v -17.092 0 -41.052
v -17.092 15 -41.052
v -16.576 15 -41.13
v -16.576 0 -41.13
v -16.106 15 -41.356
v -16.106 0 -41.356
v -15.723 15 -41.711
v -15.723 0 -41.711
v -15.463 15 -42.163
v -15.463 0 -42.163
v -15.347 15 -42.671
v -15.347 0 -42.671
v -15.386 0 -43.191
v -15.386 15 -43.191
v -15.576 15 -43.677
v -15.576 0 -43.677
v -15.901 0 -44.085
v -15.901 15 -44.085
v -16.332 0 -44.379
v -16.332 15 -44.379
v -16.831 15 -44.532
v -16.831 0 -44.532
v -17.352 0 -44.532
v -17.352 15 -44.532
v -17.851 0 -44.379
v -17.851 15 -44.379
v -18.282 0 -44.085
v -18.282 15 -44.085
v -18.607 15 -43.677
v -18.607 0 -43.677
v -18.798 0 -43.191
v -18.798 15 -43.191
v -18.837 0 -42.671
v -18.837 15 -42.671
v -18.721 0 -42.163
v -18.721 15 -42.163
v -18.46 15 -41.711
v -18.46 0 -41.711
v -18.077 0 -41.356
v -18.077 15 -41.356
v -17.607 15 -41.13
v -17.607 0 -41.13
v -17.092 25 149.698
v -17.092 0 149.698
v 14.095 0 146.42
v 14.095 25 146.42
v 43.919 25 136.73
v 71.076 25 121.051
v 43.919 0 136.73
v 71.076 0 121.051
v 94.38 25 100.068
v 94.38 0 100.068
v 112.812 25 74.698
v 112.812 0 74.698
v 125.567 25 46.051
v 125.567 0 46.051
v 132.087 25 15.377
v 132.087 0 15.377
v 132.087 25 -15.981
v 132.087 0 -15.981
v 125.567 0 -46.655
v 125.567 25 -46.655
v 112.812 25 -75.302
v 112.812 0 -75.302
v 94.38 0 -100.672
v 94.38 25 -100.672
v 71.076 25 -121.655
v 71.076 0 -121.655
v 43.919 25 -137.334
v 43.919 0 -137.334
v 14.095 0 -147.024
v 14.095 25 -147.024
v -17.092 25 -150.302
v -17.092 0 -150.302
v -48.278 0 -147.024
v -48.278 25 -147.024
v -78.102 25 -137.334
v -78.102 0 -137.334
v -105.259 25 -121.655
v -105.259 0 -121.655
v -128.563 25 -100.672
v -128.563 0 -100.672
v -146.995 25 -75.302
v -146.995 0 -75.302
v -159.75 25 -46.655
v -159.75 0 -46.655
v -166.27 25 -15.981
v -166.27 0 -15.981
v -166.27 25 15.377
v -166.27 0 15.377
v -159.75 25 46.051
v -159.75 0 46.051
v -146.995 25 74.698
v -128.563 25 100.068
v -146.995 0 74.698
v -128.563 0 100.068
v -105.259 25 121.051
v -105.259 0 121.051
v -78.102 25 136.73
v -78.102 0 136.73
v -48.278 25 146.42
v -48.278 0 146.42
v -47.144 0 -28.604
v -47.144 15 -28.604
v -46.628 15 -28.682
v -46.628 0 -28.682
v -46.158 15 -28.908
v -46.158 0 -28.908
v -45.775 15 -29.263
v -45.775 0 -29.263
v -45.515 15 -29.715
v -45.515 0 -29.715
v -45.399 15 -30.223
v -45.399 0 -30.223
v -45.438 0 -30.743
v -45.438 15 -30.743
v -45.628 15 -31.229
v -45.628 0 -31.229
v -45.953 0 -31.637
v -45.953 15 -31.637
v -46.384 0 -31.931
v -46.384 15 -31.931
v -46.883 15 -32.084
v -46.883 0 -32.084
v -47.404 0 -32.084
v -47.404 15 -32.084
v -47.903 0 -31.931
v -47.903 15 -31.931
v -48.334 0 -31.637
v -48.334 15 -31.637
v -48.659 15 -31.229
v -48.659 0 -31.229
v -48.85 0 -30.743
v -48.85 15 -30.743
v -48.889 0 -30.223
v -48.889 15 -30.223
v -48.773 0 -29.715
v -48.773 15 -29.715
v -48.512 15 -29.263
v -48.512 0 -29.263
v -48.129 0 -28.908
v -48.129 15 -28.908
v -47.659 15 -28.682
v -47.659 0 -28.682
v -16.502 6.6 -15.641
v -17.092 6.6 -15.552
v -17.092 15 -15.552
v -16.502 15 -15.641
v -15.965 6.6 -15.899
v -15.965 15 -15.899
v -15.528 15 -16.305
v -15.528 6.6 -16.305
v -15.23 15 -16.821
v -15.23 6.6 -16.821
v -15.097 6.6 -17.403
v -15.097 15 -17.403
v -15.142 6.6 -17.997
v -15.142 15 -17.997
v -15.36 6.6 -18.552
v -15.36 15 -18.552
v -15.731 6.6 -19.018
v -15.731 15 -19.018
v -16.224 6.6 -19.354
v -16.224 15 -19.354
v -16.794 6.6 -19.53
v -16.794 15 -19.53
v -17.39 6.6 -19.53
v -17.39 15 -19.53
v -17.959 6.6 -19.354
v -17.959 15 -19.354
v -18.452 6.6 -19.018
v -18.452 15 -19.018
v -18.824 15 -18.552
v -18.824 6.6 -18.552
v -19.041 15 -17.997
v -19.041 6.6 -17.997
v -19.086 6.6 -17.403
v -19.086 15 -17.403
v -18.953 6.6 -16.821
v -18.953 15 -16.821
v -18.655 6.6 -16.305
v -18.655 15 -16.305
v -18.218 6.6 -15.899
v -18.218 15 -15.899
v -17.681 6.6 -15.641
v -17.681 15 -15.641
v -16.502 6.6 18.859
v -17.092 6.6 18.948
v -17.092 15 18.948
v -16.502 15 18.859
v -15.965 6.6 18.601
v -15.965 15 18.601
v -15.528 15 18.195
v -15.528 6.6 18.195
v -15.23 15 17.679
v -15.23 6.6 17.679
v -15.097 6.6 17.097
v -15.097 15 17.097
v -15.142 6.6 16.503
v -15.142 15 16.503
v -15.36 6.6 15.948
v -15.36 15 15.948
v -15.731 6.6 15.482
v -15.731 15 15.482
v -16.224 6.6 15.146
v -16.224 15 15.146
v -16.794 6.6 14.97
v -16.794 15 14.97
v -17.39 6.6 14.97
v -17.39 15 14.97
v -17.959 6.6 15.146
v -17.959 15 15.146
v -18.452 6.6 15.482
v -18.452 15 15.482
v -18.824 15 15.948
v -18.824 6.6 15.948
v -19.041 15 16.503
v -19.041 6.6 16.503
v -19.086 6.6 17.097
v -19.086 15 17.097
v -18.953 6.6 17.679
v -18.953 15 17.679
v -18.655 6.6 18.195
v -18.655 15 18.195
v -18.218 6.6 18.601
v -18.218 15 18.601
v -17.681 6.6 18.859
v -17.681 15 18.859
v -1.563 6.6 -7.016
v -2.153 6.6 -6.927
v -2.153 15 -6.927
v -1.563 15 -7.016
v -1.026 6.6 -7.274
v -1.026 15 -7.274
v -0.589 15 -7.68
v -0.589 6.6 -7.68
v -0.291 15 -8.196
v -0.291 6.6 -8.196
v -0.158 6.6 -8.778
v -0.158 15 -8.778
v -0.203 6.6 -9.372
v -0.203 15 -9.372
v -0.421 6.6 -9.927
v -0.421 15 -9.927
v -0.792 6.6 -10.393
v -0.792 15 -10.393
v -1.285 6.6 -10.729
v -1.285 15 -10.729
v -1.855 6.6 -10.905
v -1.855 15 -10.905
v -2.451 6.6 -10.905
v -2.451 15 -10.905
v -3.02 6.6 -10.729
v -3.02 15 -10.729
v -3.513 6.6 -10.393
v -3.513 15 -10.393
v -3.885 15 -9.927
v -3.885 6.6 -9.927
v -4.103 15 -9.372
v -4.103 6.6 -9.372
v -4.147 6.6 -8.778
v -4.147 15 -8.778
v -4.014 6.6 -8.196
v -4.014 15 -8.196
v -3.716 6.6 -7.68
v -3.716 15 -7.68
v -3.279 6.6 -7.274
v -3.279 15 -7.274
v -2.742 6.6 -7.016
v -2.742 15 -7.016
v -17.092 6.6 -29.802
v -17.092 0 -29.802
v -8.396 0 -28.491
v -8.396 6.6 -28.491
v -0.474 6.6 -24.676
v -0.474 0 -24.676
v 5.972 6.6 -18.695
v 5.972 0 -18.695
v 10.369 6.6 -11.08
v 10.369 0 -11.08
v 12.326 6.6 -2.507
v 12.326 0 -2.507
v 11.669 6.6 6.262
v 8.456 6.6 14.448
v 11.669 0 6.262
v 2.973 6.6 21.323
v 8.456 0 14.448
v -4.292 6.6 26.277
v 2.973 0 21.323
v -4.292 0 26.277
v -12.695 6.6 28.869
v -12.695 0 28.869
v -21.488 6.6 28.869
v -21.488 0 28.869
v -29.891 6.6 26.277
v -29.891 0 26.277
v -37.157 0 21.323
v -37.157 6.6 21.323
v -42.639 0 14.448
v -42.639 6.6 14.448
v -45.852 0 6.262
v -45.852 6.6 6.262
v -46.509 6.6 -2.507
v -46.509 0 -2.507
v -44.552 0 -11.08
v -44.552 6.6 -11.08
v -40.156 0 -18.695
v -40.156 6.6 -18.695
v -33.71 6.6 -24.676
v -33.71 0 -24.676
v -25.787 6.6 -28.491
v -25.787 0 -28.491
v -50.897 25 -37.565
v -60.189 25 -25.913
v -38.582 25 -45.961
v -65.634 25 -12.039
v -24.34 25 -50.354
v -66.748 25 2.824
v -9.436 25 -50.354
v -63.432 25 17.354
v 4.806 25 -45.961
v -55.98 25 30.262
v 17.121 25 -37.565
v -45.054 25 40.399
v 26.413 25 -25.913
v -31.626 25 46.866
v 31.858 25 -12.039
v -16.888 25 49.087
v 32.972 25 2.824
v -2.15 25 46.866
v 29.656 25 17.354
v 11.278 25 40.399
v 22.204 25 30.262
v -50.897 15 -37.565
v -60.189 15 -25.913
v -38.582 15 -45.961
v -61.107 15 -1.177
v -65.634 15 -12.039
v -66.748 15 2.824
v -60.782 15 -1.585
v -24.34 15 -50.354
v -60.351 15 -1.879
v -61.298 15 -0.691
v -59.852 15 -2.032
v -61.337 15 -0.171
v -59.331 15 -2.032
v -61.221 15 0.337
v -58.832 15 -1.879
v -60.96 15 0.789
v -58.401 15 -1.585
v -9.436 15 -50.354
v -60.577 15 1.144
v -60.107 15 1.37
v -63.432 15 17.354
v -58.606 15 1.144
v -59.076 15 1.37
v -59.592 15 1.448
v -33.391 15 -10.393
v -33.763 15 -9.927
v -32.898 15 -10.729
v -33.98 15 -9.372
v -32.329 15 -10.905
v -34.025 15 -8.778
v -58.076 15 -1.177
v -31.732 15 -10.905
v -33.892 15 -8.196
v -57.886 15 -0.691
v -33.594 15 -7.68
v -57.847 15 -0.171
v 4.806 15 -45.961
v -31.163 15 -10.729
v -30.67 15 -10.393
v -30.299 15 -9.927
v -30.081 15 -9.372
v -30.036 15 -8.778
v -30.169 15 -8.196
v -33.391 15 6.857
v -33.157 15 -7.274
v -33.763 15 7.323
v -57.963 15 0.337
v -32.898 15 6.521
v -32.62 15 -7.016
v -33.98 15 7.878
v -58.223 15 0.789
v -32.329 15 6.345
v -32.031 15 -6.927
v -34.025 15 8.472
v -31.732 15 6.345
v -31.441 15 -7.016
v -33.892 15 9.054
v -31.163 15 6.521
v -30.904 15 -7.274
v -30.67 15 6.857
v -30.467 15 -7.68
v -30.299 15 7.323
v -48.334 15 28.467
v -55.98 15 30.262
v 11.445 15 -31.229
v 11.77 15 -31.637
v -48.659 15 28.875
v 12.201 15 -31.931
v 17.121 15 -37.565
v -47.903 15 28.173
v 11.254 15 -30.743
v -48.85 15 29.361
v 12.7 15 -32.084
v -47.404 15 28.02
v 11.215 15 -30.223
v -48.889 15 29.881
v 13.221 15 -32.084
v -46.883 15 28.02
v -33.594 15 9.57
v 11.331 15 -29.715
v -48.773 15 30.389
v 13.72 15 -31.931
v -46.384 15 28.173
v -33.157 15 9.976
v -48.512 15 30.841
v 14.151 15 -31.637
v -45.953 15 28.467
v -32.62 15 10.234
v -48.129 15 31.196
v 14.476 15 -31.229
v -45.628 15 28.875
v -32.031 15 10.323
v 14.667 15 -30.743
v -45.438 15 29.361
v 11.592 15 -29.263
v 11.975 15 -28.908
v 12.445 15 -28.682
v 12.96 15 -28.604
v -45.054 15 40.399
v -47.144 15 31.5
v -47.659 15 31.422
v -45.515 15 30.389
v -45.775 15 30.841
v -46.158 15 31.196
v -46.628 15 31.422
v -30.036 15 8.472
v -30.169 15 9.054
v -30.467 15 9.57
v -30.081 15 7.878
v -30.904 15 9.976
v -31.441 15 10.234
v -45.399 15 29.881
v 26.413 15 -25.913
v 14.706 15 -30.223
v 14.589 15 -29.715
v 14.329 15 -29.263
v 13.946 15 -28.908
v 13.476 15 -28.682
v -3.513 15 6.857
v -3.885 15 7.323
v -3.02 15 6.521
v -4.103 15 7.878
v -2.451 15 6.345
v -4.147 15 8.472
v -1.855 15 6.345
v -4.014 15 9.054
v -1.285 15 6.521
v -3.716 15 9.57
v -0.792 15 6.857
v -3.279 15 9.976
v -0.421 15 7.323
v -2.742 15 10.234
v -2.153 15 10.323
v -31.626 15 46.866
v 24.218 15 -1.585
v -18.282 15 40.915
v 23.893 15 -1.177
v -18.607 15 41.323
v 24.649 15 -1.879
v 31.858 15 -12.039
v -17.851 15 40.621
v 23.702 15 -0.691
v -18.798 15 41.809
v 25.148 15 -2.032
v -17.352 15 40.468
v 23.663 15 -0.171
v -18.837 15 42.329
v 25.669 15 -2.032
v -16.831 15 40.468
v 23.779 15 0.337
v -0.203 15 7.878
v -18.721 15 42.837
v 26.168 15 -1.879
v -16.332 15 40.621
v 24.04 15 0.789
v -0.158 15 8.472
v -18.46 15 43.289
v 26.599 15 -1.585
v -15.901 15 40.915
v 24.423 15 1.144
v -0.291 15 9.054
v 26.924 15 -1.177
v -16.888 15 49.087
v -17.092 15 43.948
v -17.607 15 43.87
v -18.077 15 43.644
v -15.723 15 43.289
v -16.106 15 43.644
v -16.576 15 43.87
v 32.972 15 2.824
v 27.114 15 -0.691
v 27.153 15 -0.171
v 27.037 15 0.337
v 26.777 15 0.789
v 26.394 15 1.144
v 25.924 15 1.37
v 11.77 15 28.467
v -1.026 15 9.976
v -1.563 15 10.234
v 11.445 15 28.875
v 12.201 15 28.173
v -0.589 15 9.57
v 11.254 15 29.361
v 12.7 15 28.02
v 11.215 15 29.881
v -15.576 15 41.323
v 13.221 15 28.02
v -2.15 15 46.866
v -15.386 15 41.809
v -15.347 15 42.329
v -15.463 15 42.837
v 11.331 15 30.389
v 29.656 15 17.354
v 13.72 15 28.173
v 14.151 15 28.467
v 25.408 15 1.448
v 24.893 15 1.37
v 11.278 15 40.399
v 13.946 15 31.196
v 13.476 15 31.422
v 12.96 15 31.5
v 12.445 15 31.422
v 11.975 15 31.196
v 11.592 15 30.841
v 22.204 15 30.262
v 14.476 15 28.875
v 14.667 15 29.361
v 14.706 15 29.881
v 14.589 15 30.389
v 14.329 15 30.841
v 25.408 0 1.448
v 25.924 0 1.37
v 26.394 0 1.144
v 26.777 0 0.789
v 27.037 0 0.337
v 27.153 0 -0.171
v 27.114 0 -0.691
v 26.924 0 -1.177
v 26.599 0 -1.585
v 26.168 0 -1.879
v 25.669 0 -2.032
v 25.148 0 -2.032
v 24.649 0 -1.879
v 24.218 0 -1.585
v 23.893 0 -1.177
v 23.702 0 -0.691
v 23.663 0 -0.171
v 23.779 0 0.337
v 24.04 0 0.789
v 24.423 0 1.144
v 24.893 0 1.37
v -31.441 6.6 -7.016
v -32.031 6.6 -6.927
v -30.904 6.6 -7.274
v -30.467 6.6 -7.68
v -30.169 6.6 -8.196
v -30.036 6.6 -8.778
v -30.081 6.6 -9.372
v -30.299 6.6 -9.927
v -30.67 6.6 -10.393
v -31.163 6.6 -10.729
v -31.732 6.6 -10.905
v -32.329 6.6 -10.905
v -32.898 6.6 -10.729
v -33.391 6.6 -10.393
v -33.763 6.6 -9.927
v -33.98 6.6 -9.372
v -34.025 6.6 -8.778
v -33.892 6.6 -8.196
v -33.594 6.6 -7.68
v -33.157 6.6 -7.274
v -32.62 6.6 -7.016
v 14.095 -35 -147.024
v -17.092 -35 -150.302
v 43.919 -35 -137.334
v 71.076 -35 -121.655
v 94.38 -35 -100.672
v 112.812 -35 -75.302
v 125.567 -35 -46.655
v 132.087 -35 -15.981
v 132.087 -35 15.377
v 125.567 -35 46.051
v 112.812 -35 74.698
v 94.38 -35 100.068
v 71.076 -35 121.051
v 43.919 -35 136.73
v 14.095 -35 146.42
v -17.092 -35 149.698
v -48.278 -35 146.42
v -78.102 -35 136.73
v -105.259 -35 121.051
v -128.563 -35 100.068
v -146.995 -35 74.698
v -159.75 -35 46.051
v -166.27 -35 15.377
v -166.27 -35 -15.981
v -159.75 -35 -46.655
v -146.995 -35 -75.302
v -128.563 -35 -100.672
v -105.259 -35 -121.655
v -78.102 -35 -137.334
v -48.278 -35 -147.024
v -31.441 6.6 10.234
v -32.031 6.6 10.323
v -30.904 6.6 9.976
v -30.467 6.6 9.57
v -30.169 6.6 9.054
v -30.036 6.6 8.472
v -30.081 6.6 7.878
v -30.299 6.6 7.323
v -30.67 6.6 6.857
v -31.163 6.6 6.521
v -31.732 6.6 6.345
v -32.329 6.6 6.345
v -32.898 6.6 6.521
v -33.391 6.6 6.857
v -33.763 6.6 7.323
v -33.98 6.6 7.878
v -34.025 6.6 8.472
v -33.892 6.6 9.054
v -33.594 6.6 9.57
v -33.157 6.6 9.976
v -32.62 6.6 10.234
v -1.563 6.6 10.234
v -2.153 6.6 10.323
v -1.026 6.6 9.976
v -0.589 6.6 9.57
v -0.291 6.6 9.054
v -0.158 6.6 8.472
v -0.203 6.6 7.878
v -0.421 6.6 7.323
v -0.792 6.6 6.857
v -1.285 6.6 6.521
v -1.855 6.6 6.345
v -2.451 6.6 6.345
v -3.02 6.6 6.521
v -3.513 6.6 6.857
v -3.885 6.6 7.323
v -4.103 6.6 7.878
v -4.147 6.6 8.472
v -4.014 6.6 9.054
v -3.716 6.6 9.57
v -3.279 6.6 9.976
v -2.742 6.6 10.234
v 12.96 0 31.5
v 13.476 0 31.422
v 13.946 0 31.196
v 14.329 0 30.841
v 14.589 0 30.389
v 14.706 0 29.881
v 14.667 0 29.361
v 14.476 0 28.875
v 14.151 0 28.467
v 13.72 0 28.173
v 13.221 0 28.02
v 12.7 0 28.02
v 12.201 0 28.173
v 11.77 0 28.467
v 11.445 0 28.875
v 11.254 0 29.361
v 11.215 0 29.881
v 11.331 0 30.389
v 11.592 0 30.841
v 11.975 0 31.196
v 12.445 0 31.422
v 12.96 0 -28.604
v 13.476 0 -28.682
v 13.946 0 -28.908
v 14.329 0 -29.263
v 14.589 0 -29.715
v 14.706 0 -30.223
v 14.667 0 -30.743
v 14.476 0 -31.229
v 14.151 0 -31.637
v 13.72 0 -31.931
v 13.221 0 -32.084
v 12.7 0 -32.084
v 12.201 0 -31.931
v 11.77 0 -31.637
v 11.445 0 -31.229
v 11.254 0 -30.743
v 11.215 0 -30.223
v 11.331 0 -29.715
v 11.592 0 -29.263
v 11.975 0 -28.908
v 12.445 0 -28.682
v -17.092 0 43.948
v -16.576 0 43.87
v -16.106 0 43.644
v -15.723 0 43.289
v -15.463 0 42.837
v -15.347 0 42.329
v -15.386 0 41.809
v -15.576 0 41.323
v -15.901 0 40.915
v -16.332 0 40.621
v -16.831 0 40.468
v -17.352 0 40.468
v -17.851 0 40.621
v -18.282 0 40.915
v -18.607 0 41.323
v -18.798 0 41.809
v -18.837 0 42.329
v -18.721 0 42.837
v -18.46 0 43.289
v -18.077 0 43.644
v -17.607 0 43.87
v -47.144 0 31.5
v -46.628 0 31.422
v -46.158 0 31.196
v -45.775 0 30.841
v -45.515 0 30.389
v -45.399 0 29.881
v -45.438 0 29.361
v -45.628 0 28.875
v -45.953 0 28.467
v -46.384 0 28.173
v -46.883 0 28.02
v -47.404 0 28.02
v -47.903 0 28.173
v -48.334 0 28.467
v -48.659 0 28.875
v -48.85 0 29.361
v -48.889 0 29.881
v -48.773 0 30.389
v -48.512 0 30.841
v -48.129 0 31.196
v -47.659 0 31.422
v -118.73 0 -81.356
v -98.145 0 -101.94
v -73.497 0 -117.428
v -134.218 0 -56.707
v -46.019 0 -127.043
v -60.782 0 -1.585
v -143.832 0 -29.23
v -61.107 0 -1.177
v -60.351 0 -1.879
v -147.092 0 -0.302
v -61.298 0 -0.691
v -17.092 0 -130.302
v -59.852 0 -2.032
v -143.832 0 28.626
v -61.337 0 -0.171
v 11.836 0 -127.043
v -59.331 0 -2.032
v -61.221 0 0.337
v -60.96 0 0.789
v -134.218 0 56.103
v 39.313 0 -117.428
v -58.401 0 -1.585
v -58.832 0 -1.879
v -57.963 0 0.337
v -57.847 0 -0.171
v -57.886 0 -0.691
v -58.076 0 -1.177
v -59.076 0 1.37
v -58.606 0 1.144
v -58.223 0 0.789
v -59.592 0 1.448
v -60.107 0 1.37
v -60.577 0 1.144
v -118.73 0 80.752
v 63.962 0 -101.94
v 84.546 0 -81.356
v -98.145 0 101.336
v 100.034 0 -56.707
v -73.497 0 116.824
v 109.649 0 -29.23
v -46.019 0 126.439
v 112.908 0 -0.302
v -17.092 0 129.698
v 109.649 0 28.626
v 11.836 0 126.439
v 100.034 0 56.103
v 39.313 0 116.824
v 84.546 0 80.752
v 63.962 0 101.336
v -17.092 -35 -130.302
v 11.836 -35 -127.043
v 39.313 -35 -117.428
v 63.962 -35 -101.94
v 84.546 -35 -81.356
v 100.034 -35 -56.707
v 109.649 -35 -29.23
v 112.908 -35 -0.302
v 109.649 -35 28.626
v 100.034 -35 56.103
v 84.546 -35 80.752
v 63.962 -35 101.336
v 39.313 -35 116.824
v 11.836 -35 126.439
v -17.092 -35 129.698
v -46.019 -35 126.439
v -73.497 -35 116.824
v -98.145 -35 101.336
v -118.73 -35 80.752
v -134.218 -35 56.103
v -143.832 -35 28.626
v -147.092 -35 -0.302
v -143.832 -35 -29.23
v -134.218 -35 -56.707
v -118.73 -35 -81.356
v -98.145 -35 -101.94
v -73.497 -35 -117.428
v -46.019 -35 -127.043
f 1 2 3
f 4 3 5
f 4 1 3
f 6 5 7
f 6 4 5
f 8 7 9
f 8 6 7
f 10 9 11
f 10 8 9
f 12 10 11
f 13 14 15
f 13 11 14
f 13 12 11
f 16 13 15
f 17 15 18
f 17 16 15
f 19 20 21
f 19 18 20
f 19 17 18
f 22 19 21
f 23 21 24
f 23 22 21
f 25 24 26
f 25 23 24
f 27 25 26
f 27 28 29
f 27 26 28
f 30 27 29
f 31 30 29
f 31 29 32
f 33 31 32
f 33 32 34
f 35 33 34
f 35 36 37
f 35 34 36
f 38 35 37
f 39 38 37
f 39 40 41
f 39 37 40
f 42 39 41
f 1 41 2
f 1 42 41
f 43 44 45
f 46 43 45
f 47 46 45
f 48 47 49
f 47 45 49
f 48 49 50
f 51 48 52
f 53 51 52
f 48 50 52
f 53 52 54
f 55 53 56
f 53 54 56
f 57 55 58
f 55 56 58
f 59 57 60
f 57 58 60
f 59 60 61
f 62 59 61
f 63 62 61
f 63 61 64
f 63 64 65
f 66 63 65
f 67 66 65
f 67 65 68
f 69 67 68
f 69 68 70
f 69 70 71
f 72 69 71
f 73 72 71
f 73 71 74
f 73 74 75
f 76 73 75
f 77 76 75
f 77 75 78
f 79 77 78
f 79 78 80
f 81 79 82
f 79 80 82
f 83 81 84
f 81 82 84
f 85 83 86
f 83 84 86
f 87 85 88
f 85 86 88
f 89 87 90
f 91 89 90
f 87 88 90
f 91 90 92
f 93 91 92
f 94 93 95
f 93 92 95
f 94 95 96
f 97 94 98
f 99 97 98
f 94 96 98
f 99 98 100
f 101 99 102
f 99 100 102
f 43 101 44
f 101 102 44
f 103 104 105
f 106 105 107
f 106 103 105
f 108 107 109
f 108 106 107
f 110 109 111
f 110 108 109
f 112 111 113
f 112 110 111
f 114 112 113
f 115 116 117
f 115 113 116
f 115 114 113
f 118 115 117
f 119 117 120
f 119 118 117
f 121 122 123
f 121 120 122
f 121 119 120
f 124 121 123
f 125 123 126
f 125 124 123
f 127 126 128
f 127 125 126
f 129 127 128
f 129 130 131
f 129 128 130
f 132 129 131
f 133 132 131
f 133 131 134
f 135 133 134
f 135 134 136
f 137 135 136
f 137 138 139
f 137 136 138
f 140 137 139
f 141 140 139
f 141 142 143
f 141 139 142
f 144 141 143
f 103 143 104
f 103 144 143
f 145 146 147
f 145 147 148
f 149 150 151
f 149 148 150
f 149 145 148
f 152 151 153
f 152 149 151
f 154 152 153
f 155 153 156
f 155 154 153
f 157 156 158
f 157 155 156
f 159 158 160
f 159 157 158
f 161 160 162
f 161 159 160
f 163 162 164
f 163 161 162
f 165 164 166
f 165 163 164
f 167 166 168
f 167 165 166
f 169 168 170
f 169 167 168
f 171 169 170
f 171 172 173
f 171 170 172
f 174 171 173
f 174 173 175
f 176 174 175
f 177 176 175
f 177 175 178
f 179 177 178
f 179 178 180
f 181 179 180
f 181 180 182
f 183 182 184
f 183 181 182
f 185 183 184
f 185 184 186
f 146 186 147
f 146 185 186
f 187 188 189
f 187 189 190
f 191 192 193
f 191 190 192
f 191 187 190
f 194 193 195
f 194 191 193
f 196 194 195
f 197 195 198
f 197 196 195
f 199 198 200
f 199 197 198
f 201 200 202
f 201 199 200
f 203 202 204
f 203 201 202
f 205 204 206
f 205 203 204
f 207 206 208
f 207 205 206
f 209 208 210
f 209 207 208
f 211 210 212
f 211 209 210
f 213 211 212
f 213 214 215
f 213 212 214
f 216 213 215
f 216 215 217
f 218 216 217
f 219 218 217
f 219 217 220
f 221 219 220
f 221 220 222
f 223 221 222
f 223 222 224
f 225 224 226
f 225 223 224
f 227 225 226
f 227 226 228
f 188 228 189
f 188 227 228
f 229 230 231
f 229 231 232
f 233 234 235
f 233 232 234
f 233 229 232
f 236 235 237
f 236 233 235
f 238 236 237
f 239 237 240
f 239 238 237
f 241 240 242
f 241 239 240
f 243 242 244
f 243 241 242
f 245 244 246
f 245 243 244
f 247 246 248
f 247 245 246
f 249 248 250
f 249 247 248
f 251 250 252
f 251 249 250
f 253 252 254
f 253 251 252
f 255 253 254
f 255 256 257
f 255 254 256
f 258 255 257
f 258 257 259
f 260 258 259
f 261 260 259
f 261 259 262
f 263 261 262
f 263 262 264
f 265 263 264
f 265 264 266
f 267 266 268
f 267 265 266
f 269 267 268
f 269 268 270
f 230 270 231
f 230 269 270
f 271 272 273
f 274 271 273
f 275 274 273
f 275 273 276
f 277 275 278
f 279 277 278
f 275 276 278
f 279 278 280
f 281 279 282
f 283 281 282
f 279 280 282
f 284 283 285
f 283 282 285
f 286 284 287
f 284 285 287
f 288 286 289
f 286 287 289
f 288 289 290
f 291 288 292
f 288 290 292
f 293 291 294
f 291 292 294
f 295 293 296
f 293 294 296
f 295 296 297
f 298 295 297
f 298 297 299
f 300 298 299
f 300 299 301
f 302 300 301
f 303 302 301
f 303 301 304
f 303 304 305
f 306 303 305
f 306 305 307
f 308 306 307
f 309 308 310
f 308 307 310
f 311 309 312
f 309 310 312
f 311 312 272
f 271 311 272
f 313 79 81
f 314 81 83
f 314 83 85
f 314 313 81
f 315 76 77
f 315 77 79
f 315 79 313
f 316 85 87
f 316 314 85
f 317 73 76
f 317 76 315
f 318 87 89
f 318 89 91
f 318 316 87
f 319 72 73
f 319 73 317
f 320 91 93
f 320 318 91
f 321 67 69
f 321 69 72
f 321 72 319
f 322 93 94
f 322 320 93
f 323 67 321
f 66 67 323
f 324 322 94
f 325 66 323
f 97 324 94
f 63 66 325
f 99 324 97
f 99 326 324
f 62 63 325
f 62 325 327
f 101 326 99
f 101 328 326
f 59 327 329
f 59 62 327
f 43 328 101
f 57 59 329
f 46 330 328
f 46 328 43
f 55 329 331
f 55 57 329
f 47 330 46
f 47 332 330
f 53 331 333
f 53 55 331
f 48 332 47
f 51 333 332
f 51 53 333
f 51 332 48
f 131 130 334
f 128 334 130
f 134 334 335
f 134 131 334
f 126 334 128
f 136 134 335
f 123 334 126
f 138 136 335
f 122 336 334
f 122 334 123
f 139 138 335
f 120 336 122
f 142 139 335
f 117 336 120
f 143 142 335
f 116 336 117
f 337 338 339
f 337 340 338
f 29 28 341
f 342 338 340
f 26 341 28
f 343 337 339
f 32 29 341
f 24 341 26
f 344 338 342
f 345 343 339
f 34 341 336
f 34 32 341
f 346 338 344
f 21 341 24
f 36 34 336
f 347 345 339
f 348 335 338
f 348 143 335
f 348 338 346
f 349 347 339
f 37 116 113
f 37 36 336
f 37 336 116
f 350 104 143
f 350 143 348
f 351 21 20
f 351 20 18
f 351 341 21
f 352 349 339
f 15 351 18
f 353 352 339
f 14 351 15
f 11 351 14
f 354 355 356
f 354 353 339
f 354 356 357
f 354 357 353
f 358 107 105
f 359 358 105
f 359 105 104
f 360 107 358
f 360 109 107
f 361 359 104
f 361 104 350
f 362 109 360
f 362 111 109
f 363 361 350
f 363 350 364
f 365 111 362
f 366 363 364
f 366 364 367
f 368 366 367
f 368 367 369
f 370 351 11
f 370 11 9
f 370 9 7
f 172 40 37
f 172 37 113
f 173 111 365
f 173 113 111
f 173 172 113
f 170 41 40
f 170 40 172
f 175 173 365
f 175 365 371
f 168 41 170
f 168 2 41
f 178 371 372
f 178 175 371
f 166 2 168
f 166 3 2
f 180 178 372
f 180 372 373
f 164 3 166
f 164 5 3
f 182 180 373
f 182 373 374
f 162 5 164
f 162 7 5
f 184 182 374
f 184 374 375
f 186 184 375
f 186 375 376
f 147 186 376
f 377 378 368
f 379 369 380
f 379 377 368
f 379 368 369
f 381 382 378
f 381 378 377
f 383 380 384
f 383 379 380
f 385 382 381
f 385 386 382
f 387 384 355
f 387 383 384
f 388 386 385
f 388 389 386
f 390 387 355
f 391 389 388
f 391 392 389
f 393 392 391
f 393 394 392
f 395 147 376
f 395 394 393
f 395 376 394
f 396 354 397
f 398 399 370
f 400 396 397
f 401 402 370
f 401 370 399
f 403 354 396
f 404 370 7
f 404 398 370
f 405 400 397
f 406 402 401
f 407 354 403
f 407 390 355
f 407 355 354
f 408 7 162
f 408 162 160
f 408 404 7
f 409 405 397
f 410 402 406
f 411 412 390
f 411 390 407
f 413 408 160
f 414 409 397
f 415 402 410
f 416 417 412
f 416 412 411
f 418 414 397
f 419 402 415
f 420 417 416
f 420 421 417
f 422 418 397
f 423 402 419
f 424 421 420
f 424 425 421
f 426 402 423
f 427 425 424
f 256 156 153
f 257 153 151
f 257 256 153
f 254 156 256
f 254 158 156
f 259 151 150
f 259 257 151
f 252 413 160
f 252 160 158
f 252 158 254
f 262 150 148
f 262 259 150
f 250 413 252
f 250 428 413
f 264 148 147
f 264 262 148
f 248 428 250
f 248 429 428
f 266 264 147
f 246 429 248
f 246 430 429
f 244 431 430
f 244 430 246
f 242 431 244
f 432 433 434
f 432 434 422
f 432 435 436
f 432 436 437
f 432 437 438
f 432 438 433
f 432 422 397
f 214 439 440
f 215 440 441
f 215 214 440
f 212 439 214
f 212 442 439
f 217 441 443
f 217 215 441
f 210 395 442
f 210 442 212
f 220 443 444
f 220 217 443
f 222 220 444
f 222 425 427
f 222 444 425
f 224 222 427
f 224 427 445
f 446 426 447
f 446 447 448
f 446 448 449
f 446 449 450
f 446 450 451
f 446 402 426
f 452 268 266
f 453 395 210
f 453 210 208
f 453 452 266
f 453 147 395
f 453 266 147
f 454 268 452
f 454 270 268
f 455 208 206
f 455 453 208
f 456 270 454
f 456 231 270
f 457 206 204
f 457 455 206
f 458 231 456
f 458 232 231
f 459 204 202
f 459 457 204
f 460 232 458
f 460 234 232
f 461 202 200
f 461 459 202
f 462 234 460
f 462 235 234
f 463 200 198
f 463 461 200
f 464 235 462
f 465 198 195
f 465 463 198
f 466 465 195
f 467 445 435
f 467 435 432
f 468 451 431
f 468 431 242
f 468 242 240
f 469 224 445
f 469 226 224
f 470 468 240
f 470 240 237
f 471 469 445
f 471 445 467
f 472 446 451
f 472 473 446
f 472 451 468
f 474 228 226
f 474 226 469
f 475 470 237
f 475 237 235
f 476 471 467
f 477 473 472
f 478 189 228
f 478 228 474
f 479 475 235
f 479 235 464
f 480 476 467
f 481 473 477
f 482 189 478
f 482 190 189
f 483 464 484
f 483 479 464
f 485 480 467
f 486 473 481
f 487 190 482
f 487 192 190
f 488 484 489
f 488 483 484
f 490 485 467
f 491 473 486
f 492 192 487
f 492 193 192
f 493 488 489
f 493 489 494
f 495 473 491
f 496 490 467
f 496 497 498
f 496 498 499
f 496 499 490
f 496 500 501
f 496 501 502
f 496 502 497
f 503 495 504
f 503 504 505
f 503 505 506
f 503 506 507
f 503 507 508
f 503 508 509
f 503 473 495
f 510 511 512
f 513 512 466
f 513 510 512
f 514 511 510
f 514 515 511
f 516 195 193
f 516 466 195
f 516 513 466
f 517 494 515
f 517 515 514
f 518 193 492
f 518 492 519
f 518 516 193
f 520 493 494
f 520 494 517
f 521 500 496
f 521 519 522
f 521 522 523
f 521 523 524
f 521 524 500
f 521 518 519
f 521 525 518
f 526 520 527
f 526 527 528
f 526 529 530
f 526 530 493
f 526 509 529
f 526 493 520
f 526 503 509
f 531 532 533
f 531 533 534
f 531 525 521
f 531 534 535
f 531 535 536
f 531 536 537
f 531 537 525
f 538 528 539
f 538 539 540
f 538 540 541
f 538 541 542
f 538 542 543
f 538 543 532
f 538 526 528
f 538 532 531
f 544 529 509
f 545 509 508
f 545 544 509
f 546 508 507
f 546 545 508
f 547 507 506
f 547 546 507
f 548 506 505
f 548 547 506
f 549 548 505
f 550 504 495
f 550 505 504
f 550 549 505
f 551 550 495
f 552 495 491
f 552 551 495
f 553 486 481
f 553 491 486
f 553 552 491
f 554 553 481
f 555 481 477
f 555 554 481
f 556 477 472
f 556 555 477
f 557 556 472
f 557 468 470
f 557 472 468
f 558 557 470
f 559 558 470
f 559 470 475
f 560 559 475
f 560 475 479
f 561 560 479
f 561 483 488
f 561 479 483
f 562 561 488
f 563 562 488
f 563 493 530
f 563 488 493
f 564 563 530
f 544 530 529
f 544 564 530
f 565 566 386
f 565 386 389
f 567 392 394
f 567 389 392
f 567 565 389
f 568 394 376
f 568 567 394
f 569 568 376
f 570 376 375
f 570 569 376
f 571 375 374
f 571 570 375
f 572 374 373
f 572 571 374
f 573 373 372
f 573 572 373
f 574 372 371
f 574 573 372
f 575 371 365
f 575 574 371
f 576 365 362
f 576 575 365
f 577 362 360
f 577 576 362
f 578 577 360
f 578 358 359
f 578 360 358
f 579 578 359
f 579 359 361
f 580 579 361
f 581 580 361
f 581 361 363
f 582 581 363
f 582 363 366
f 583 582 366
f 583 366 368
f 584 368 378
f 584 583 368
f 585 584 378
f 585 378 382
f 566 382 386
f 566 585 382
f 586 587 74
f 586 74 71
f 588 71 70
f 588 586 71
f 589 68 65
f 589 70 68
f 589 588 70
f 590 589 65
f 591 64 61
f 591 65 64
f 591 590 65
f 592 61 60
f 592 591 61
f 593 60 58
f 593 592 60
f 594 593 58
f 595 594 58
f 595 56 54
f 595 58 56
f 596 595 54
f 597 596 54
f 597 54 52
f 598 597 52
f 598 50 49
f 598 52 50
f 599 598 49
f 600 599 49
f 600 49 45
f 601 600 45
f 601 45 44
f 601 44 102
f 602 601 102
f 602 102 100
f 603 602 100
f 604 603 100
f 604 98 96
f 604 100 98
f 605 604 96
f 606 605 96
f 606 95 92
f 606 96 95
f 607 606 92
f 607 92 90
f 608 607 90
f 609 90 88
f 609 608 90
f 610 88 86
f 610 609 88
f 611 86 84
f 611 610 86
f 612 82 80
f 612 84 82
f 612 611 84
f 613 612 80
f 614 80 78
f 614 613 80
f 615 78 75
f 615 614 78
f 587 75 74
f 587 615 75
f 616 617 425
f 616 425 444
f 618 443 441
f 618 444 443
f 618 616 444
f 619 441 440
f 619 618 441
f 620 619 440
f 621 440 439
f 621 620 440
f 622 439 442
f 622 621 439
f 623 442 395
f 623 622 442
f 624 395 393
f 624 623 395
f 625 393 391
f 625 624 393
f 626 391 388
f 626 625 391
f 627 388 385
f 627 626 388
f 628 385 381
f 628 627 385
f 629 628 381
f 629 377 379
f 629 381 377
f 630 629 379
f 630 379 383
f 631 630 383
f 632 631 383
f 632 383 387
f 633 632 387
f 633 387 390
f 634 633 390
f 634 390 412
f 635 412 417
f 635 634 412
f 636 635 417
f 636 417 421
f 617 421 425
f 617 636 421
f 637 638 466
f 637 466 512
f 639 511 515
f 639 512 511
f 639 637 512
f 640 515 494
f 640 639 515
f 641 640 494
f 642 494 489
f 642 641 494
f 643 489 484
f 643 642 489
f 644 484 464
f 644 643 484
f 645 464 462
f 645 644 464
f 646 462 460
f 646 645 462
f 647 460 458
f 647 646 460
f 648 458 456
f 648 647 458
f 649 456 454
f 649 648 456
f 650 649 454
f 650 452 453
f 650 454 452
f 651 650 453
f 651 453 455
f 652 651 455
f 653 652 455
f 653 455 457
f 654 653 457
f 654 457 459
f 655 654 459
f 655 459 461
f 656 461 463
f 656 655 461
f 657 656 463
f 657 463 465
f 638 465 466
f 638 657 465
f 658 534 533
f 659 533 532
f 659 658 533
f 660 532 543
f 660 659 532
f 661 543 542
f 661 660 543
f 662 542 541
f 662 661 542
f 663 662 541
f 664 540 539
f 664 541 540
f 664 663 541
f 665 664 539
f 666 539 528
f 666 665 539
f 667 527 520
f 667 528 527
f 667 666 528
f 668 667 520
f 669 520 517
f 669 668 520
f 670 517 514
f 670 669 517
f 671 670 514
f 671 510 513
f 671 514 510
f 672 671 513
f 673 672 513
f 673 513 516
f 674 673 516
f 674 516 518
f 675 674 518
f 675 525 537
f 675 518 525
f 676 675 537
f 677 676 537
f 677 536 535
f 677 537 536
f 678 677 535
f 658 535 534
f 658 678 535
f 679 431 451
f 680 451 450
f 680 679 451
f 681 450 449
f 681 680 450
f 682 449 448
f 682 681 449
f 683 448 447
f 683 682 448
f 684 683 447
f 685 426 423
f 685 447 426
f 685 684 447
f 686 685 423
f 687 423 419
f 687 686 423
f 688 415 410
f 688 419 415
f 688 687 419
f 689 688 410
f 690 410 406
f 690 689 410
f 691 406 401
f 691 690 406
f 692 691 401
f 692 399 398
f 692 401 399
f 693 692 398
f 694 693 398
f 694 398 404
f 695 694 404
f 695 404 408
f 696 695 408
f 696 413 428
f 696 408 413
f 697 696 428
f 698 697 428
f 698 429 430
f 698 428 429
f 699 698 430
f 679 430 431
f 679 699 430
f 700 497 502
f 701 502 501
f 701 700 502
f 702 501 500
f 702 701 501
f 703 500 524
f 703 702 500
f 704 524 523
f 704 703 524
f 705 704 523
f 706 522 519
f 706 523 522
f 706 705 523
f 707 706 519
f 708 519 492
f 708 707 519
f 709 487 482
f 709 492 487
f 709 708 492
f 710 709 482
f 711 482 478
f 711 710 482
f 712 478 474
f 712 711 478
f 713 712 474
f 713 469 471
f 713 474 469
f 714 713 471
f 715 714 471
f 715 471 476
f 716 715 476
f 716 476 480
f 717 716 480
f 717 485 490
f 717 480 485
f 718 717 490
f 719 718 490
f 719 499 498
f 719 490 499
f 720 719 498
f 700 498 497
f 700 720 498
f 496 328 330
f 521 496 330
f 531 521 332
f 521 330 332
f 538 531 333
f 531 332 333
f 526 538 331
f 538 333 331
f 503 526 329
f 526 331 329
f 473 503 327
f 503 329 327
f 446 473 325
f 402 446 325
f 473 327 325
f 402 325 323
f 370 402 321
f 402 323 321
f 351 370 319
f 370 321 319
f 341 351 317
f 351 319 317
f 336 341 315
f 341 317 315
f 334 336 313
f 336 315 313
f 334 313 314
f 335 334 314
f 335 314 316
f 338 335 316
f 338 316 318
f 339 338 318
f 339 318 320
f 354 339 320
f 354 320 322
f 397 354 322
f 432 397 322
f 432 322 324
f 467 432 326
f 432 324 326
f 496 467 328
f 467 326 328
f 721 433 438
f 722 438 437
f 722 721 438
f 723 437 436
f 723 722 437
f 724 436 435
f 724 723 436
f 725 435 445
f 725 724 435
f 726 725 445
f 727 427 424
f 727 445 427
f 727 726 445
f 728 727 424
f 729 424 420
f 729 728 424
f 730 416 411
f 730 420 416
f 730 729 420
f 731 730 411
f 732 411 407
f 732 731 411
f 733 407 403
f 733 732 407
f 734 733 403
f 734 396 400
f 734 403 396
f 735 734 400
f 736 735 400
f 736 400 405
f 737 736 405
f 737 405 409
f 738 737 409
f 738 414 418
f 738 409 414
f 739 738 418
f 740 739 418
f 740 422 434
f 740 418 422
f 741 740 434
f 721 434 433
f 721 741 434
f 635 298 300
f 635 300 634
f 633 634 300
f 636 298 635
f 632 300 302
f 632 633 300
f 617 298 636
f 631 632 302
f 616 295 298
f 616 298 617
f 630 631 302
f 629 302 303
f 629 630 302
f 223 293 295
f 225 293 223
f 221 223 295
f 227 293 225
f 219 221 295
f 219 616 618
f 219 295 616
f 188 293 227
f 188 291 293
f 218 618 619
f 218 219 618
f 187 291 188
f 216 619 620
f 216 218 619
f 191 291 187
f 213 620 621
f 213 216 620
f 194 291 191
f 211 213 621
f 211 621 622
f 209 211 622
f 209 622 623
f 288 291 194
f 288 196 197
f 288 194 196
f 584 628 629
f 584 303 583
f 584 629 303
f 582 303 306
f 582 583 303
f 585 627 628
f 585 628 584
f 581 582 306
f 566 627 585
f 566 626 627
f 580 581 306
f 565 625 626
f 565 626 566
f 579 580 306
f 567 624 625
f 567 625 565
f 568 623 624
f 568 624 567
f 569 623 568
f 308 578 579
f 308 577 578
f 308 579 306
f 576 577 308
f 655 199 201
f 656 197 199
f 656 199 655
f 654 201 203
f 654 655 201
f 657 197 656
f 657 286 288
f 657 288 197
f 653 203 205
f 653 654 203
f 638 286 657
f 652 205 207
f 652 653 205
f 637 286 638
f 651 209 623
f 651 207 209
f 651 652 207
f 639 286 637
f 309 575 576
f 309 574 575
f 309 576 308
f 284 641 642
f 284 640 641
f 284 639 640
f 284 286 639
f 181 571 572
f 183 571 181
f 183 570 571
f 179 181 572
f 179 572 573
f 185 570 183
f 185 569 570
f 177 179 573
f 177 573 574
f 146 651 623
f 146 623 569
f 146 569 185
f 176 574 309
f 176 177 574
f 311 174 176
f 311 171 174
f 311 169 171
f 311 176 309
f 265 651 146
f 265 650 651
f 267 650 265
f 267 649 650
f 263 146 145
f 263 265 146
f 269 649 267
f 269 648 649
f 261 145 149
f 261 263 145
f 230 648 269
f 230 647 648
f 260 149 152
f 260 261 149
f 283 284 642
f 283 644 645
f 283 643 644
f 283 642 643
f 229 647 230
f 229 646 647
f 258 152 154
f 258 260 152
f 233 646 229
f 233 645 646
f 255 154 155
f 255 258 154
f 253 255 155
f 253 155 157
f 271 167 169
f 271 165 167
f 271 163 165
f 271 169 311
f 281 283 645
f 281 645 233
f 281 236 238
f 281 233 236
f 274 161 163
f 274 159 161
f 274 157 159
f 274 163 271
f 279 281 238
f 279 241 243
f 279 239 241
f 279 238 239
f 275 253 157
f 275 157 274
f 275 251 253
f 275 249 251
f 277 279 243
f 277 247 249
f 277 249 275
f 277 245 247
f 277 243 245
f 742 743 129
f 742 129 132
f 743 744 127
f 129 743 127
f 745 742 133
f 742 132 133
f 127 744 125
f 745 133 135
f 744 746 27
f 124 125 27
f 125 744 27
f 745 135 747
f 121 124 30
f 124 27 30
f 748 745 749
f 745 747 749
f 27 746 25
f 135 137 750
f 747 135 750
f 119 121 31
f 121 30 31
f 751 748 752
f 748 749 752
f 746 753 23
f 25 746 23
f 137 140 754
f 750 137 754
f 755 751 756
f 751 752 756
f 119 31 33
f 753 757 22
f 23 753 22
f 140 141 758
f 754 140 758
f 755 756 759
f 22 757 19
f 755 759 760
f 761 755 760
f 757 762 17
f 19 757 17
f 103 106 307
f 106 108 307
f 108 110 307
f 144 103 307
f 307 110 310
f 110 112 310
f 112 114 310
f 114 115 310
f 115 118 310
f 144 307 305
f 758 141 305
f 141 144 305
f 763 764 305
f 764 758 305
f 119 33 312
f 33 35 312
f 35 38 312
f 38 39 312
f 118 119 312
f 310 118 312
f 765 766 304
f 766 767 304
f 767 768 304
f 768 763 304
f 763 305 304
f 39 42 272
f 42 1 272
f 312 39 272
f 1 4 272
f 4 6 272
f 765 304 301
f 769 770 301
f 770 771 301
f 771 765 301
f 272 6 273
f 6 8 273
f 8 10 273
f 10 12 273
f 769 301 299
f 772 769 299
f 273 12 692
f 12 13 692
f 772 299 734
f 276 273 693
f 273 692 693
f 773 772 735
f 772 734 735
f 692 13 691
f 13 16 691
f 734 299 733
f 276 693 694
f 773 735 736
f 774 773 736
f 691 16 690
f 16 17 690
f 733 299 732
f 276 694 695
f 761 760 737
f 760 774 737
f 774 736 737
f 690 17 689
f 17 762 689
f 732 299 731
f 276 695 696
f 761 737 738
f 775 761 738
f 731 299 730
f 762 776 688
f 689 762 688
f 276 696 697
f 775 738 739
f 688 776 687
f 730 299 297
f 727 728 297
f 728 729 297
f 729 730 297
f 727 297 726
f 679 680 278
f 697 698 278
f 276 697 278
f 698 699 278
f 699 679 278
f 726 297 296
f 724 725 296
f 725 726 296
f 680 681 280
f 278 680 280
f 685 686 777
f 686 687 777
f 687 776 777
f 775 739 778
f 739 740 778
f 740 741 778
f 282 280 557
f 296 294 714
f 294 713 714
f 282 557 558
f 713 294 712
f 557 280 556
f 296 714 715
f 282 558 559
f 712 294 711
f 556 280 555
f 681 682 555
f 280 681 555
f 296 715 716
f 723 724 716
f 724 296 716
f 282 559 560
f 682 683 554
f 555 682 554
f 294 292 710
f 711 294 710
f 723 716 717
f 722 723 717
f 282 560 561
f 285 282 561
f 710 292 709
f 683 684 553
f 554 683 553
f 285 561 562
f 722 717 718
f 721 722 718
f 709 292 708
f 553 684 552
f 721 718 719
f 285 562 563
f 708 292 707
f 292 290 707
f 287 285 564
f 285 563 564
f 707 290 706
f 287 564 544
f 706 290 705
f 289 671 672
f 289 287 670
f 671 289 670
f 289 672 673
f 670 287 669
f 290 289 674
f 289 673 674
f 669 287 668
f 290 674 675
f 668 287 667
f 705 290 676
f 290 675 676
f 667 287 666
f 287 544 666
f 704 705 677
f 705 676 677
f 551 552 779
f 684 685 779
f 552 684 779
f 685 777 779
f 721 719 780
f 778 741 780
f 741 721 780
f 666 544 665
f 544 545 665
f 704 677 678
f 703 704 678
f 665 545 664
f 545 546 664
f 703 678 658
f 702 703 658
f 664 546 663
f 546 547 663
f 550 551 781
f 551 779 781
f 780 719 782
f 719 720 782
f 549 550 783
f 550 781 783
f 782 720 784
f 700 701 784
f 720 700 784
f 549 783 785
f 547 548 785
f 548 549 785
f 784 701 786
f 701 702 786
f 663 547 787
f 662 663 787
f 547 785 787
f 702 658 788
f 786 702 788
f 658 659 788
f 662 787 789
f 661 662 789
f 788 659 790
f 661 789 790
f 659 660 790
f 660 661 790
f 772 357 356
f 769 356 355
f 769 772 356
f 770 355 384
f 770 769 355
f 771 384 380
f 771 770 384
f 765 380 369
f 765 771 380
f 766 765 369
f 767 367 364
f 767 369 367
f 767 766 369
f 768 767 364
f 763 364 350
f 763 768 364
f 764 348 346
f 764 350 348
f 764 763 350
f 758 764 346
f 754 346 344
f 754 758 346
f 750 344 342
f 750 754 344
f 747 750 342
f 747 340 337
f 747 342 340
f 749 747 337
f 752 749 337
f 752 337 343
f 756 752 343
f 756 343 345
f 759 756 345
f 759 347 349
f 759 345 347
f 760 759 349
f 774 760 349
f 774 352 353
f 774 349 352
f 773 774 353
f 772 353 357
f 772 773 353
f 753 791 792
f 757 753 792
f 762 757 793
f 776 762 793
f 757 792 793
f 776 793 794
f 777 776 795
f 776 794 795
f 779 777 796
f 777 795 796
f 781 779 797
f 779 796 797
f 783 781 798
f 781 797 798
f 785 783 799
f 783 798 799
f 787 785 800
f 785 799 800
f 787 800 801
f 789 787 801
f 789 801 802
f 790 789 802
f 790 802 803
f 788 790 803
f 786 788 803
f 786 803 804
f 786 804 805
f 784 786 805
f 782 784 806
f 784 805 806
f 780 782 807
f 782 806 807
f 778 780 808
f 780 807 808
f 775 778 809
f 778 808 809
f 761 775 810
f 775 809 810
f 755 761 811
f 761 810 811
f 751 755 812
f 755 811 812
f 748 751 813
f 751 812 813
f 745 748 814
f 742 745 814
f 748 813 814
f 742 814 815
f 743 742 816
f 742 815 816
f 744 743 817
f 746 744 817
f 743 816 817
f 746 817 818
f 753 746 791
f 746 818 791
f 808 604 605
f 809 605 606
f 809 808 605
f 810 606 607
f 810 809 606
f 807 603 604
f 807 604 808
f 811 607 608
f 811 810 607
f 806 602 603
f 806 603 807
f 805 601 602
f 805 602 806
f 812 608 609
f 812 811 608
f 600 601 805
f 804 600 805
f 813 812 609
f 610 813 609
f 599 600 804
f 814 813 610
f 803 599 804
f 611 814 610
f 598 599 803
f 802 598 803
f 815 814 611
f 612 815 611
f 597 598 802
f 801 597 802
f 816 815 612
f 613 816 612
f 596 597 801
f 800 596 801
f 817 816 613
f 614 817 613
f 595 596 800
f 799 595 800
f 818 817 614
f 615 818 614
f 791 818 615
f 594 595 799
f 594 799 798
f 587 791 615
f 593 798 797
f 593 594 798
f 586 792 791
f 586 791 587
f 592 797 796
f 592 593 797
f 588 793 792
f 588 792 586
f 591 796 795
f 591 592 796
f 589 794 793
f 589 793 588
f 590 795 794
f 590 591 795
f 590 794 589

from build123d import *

# Parameters (mm, degrees)
SKETCH_1_R          = 150
SKETCH_1_R_2        = 2
SKETCH_1_R_3        = 1.75
EXTRUDE_2_DEPTH     = 25
SKETCH_2_R          = 29.5
CUT_EXTRUDE_1_DEPTH = 6.6
SKETCH_3_R          = 50
CUT_EXTRUDE_2_DEPTH = 10
EXTRUDE_START       = 35
SKETCH_10_R         = 150
SKETCH_10_R_2       = 130
EXTRUDE_7_DEPTH     = 35


with BuildPart() as part:
    # 草图1 → 凸台-拉伸2 (new body)
    with BuildSketch(Plane(origin=(0, 0, 0), x_dir=(1, 0, 0), z_dir=(0, 1, 0))):
        with Locations(Location((-17.091633393, 0.301972321, 0), (0, 0, 270))):
            Circle(SKETCH_1_R)
        with Locations(Location((-17.091633393, 17.551972321, 0), (0, 0, 270))):
            Circle(SKETCH_1_R_2, mode=Mode.SUBTRACT)
        with Locations(Location((-17.091633393, 42.801972321, 0), (0, 0, 270))):
            Circle(SKETCH_1_R_3, mode=Mode.SUBTRACT)
        with Locations(Location((12.960404807, 30.354010522, 0), (0, 0, 270))):
            Circle(SKETCH_1_R_3, mode=Mode.SUBTRACT)
        with Locations(Location((25.408366607, 0.301972321, 0), (0, 0, 270))):
            Circle(SKETCH_1_R_3, mode=Mode.SUBTRACT)
        with Locations(Location((12.960404807, -29.750065879, 0), (0, 0, 270))):
            Circle(SKETCH_1_R_3, mode=Mode.SUBTRACT)
        with Locations(Location((-17.091633393, -42.198027679, 0), (0, 0, 270))):
            Circle(SKETCH_1_R_3, mode=Mode.SUBTRACT)
        with Locations(Location((-47.143671594, -29.750065879, 0), (0, 0, 270))):
            Circle(SKETCH_1_R_3, mode=Mode.SUBTRACT)
        with Locations(Location((-59.591633393, 0.301972321, 0), (0, 0, 270))):
            Circle(SKETCH_1_R_3, mode=Mode.SUBTRACT)
        with Locations(Location((-47.143671594, 30.354010522, 0), (0, 0, 270))):
            Circle(SKETCH_1_R_3, mode=Mode.SUBTRACT)
        with Locations(Location((-2.152695178, 8.926972321, 0), (0, 0, 270))):
            Circle(SKETCH_1_R_2, mode=Mode.SUBTRACT)
        with Locations(Location((-2.152695178, -8.323027679, 0), (0, 0, 270))):
            Circle(SKETCH_1_R_2, mode=Mode.SUBTRACT)
        with Locations(Location((-17.091633393, -16.948027679, 0), (0, 0, 270))):
            Circle(SKETCH_1_R_2, mode=Mode.SUBTRACT)
        with Locations(Location((-32.030571609, -8.323027679, 0), (0, 0, 270))):
            Circle(SKETCH_1_R_2, mode=Mode.SUBTRACT)
        with Locations(Location((-32.030571609, 8.926972321, 0), (0, 0, 270))):
            Circle(SKETCH_1_R_2, mode=Mode.SUBTRACT)
    extrude(amount=EXTRUDE_2_DEPTH)

    # 草图2 → 切除-拉伸1 (cut)
    with BuildSketch(Plane.XZ):
        with Locations(Location((-17.091633393, -0.301972321, 0), (0, 0, 270))):
            Circle(SKETCH_2_R)
    extrude(amount=-CUT_EXTRUDE_1_DEPTH, mode=Mode.SUBTRACT)

    # 草图3 → 切除-拉伸2 (cut)
    with BuildSketch(Plane(origin=(0, 25, 0), x_dir=(1, 0, 0), z_dir=(0, 1, 0))):
        with Locations(Location((-16.888033671, 0.912771488, 0), (0, 0, 270))):
            Circle(SKETCH_3_R)
    extrude(amount=-CUT_EXTRUDE_2_DEPTH, mode=Mode.SUBTRACT)

    # 草图10 → 凸台-拉伸7 (add)
    with BuildSketch(Plane.XZ.offset(EXTRUDE_START)):
        with Locations(Location((-17.091633393, -0.301972321, 0), (0, 0, 270))):
            Circle(SKETCH_10_R)
        with Locations(Location((-17.091633393, -0.301972321, 0), (0, 0, 270))):
            Circle(SKETCH_10_R_2, mode=Mode.SUBTRACT)
    extrude(amount=-EXTRUDE_7_DEPTH)


solid = part.part
